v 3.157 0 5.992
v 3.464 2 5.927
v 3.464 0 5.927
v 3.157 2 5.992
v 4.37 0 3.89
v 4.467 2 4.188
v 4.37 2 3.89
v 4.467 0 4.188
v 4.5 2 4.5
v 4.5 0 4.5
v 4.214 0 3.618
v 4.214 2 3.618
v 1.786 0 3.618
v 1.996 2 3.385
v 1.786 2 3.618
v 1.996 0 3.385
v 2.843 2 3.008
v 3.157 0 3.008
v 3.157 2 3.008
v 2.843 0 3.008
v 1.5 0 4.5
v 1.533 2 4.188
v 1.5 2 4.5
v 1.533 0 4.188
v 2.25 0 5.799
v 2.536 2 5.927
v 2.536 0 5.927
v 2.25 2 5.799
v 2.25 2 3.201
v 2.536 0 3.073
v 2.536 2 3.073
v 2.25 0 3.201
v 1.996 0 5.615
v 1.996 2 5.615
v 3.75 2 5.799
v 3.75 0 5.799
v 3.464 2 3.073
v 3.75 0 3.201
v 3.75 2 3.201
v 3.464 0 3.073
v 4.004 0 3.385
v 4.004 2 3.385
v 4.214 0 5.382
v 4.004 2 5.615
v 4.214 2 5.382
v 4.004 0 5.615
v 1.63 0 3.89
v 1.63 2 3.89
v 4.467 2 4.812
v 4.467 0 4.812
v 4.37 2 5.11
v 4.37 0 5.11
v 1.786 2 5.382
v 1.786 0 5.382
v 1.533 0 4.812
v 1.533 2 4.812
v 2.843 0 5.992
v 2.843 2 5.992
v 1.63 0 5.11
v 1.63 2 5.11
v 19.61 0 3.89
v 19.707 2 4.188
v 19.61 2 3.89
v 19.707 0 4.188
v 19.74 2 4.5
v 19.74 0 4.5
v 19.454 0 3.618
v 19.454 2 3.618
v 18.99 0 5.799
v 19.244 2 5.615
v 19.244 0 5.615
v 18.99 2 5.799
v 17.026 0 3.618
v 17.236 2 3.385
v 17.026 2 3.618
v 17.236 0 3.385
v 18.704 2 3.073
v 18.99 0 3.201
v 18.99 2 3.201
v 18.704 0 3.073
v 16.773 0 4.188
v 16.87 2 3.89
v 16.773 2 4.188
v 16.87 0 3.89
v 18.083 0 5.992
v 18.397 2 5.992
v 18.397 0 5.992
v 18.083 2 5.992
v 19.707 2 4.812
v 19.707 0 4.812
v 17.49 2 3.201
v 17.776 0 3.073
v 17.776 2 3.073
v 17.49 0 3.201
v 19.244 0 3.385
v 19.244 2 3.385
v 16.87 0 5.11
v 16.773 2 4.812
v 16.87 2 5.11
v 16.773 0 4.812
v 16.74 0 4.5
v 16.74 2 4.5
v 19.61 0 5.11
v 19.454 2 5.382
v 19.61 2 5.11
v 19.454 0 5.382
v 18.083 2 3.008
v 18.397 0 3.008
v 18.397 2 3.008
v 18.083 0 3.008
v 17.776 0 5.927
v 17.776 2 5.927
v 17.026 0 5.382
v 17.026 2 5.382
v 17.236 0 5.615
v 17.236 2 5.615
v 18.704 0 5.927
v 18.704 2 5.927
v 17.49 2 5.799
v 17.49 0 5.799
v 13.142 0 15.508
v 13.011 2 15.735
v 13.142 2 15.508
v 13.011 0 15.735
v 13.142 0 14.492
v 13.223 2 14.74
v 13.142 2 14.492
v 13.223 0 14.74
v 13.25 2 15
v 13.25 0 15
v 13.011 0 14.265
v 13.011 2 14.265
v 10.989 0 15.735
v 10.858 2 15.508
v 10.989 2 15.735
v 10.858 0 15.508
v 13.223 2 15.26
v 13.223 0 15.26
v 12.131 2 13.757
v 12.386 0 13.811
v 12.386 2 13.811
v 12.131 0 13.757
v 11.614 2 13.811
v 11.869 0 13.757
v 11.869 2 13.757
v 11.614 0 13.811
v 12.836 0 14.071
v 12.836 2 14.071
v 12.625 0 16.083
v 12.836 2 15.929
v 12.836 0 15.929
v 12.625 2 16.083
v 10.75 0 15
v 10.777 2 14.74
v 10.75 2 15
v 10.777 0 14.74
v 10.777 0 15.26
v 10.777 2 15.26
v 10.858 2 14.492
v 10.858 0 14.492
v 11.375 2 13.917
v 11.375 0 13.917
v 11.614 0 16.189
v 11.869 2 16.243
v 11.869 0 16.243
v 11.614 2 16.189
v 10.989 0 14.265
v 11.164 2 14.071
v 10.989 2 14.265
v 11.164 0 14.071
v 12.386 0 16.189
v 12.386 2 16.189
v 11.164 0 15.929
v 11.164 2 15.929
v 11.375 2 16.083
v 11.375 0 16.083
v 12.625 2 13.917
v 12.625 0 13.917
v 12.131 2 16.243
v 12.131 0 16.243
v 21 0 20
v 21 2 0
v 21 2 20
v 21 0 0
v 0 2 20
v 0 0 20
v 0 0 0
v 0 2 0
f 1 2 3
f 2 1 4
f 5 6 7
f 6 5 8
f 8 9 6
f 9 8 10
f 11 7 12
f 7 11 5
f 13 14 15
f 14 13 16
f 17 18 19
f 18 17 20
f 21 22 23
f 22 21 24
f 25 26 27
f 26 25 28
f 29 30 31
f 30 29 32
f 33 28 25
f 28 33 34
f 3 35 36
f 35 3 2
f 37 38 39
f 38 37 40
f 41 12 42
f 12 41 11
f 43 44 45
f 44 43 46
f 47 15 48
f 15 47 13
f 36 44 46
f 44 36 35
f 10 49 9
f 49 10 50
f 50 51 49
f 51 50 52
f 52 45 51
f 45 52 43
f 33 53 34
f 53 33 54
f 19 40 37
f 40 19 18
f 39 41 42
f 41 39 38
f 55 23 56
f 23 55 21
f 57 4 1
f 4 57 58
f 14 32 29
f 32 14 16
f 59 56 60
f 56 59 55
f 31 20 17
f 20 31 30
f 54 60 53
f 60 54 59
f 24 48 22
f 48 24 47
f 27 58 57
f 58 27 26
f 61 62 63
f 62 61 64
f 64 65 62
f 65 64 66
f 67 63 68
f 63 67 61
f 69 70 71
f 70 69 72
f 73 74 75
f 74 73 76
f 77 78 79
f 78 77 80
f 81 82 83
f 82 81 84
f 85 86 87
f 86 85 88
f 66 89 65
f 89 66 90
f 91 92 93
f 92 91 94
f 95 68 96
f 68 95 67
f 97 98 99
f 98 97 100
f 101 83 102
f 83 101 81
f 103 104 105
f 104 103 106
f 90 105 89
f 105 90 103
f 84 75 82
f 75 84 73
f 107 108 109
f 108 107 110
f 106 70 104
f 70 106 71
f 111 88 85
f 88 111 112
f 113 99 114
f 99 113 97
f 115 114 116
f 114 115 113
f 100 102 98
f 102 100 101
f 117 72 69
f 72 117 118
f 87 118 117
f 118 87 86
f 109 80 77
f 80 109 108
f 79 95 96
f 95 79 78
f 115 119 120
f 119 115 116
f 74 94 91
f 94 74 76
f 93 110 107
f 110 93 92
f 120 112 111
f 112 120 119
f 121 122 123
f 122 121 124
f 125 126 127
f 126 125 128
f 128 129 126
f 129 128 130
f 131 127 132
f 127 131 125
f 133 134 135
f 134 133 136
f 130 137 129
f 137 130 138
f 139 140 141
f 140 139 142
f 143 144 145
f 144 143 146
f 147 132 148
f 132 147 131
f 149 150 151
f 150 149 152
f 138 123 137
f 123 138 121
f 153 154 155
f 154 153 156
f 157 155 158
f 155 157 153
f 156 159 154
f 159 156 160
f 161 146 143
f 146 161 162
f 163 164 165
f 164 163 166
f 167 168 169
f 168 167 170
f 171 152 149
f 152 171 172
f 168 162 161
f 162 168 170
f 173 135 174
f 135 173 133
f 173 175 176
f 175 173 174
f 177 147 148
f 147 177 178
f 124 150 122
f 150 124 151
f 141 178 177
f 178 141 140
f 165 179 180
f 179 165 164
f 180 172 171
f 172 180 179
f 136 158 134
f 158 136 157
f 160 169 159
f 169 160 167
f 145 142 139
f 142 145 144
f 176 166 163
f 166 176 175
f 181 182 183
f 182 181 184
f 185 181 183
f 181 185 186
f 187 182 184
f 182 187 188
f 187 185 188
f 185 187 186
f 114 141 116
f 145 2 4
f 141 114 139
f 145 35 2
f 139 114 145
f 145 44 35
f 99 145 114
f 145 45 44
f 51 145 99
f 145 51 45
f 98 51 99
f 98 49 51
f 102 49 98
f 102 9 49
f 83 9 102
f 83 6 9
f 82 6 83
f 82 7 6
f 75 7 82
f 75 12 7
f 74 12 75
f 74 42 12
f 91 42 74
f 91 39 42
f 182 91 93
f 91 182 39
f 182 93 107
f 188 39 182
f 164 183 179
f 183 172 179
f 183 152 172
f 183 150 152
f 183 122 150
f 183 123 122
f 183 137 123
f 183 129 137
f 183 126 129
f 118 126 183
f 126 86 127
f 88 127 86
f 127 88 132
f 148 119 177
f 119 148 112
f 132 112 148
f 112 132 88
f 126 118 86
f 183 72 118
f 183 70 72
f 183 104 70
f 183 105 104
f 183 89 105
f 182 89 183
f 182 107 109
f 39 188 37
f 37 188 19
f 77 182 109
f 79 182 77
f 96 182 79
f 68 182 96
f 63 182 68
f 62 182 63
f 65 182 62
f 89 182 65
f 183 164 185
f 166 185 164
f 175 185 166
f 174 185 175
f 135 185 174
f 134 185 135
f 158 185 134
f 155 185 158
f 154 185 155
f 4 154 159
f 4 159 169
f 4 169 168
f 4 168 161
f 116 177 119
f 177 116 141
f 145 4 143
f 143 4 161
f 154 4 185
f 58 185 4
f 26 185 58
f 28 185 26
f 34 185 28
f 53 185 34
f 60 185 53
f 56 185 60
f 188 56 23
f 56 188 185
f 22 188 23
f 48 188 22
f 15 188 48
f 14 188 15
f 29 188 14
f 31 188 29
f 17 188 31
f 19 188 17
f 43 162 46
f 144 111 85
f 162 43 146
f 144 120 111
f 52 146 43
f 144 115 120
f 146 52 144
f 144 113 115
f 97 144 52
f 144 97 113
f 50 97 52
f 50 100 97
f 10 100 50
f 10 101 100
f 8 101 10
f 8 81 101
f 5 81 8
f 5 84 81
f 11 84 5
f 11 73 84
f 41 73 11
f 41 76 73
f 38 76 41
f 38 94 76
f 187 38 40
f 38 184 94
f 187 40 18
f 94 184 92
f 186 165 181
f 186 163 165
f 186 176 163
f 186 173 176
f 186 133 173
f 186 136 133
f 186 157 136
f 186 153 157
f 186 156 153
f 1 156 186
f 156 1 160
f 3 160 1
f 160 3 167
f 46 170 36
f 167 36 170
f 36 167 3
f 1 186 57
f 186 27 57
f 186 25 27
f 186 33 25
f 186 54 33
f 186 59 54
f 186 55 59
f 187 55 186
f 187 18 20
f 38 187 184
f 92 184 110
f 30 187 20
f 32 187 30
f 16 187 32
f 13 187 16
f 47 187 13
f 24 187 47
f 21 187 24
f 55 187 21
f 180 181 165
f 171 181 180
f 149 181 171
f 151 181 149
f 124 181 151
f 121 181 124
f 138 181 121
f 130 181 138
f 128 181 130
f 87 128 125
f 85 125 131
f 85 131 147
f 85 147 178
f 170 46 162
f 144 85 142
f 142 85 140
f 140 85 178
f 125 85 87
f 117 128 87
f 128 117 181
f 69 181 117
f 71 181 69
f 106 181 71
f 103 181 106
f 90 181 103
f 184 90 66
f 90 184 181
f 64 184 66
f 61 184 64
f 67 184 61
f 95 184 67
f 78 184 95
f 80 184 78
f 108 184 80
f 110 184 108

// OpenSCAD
// file: ../one_u_tiles/tile_common.scad
/*
Common modules and functions for 1U Tiles
*/

function inches( x) = x * 25.4; // convert inches to mm

// put a hole in the tile of diameter 'd' at position 'x','z'
module hole( x, z, d) {
    translate([x, 0, z])
        rotate([270,0,0])
            cylinder(r=(d / 2), h=10, center=true);
}
// main file
use <../one_u_tiles/tile_common.scad>;

module cutouts(){
    $fs=0.1; // min feature size - increases arc quality

    // two mounting holes for the eurorack
    left = 3;
    hole(x=left, z=4.5, d=3);
    hole(x=left+5.08*3, z=4.5, d=3);

    // hole to mount Korg front panel screws
    hole(x=12, z=15, d=2.5);
}

module positive() {
    cube([21,2,20]);
}

difference() {
    positive();
    cutouts();
}
